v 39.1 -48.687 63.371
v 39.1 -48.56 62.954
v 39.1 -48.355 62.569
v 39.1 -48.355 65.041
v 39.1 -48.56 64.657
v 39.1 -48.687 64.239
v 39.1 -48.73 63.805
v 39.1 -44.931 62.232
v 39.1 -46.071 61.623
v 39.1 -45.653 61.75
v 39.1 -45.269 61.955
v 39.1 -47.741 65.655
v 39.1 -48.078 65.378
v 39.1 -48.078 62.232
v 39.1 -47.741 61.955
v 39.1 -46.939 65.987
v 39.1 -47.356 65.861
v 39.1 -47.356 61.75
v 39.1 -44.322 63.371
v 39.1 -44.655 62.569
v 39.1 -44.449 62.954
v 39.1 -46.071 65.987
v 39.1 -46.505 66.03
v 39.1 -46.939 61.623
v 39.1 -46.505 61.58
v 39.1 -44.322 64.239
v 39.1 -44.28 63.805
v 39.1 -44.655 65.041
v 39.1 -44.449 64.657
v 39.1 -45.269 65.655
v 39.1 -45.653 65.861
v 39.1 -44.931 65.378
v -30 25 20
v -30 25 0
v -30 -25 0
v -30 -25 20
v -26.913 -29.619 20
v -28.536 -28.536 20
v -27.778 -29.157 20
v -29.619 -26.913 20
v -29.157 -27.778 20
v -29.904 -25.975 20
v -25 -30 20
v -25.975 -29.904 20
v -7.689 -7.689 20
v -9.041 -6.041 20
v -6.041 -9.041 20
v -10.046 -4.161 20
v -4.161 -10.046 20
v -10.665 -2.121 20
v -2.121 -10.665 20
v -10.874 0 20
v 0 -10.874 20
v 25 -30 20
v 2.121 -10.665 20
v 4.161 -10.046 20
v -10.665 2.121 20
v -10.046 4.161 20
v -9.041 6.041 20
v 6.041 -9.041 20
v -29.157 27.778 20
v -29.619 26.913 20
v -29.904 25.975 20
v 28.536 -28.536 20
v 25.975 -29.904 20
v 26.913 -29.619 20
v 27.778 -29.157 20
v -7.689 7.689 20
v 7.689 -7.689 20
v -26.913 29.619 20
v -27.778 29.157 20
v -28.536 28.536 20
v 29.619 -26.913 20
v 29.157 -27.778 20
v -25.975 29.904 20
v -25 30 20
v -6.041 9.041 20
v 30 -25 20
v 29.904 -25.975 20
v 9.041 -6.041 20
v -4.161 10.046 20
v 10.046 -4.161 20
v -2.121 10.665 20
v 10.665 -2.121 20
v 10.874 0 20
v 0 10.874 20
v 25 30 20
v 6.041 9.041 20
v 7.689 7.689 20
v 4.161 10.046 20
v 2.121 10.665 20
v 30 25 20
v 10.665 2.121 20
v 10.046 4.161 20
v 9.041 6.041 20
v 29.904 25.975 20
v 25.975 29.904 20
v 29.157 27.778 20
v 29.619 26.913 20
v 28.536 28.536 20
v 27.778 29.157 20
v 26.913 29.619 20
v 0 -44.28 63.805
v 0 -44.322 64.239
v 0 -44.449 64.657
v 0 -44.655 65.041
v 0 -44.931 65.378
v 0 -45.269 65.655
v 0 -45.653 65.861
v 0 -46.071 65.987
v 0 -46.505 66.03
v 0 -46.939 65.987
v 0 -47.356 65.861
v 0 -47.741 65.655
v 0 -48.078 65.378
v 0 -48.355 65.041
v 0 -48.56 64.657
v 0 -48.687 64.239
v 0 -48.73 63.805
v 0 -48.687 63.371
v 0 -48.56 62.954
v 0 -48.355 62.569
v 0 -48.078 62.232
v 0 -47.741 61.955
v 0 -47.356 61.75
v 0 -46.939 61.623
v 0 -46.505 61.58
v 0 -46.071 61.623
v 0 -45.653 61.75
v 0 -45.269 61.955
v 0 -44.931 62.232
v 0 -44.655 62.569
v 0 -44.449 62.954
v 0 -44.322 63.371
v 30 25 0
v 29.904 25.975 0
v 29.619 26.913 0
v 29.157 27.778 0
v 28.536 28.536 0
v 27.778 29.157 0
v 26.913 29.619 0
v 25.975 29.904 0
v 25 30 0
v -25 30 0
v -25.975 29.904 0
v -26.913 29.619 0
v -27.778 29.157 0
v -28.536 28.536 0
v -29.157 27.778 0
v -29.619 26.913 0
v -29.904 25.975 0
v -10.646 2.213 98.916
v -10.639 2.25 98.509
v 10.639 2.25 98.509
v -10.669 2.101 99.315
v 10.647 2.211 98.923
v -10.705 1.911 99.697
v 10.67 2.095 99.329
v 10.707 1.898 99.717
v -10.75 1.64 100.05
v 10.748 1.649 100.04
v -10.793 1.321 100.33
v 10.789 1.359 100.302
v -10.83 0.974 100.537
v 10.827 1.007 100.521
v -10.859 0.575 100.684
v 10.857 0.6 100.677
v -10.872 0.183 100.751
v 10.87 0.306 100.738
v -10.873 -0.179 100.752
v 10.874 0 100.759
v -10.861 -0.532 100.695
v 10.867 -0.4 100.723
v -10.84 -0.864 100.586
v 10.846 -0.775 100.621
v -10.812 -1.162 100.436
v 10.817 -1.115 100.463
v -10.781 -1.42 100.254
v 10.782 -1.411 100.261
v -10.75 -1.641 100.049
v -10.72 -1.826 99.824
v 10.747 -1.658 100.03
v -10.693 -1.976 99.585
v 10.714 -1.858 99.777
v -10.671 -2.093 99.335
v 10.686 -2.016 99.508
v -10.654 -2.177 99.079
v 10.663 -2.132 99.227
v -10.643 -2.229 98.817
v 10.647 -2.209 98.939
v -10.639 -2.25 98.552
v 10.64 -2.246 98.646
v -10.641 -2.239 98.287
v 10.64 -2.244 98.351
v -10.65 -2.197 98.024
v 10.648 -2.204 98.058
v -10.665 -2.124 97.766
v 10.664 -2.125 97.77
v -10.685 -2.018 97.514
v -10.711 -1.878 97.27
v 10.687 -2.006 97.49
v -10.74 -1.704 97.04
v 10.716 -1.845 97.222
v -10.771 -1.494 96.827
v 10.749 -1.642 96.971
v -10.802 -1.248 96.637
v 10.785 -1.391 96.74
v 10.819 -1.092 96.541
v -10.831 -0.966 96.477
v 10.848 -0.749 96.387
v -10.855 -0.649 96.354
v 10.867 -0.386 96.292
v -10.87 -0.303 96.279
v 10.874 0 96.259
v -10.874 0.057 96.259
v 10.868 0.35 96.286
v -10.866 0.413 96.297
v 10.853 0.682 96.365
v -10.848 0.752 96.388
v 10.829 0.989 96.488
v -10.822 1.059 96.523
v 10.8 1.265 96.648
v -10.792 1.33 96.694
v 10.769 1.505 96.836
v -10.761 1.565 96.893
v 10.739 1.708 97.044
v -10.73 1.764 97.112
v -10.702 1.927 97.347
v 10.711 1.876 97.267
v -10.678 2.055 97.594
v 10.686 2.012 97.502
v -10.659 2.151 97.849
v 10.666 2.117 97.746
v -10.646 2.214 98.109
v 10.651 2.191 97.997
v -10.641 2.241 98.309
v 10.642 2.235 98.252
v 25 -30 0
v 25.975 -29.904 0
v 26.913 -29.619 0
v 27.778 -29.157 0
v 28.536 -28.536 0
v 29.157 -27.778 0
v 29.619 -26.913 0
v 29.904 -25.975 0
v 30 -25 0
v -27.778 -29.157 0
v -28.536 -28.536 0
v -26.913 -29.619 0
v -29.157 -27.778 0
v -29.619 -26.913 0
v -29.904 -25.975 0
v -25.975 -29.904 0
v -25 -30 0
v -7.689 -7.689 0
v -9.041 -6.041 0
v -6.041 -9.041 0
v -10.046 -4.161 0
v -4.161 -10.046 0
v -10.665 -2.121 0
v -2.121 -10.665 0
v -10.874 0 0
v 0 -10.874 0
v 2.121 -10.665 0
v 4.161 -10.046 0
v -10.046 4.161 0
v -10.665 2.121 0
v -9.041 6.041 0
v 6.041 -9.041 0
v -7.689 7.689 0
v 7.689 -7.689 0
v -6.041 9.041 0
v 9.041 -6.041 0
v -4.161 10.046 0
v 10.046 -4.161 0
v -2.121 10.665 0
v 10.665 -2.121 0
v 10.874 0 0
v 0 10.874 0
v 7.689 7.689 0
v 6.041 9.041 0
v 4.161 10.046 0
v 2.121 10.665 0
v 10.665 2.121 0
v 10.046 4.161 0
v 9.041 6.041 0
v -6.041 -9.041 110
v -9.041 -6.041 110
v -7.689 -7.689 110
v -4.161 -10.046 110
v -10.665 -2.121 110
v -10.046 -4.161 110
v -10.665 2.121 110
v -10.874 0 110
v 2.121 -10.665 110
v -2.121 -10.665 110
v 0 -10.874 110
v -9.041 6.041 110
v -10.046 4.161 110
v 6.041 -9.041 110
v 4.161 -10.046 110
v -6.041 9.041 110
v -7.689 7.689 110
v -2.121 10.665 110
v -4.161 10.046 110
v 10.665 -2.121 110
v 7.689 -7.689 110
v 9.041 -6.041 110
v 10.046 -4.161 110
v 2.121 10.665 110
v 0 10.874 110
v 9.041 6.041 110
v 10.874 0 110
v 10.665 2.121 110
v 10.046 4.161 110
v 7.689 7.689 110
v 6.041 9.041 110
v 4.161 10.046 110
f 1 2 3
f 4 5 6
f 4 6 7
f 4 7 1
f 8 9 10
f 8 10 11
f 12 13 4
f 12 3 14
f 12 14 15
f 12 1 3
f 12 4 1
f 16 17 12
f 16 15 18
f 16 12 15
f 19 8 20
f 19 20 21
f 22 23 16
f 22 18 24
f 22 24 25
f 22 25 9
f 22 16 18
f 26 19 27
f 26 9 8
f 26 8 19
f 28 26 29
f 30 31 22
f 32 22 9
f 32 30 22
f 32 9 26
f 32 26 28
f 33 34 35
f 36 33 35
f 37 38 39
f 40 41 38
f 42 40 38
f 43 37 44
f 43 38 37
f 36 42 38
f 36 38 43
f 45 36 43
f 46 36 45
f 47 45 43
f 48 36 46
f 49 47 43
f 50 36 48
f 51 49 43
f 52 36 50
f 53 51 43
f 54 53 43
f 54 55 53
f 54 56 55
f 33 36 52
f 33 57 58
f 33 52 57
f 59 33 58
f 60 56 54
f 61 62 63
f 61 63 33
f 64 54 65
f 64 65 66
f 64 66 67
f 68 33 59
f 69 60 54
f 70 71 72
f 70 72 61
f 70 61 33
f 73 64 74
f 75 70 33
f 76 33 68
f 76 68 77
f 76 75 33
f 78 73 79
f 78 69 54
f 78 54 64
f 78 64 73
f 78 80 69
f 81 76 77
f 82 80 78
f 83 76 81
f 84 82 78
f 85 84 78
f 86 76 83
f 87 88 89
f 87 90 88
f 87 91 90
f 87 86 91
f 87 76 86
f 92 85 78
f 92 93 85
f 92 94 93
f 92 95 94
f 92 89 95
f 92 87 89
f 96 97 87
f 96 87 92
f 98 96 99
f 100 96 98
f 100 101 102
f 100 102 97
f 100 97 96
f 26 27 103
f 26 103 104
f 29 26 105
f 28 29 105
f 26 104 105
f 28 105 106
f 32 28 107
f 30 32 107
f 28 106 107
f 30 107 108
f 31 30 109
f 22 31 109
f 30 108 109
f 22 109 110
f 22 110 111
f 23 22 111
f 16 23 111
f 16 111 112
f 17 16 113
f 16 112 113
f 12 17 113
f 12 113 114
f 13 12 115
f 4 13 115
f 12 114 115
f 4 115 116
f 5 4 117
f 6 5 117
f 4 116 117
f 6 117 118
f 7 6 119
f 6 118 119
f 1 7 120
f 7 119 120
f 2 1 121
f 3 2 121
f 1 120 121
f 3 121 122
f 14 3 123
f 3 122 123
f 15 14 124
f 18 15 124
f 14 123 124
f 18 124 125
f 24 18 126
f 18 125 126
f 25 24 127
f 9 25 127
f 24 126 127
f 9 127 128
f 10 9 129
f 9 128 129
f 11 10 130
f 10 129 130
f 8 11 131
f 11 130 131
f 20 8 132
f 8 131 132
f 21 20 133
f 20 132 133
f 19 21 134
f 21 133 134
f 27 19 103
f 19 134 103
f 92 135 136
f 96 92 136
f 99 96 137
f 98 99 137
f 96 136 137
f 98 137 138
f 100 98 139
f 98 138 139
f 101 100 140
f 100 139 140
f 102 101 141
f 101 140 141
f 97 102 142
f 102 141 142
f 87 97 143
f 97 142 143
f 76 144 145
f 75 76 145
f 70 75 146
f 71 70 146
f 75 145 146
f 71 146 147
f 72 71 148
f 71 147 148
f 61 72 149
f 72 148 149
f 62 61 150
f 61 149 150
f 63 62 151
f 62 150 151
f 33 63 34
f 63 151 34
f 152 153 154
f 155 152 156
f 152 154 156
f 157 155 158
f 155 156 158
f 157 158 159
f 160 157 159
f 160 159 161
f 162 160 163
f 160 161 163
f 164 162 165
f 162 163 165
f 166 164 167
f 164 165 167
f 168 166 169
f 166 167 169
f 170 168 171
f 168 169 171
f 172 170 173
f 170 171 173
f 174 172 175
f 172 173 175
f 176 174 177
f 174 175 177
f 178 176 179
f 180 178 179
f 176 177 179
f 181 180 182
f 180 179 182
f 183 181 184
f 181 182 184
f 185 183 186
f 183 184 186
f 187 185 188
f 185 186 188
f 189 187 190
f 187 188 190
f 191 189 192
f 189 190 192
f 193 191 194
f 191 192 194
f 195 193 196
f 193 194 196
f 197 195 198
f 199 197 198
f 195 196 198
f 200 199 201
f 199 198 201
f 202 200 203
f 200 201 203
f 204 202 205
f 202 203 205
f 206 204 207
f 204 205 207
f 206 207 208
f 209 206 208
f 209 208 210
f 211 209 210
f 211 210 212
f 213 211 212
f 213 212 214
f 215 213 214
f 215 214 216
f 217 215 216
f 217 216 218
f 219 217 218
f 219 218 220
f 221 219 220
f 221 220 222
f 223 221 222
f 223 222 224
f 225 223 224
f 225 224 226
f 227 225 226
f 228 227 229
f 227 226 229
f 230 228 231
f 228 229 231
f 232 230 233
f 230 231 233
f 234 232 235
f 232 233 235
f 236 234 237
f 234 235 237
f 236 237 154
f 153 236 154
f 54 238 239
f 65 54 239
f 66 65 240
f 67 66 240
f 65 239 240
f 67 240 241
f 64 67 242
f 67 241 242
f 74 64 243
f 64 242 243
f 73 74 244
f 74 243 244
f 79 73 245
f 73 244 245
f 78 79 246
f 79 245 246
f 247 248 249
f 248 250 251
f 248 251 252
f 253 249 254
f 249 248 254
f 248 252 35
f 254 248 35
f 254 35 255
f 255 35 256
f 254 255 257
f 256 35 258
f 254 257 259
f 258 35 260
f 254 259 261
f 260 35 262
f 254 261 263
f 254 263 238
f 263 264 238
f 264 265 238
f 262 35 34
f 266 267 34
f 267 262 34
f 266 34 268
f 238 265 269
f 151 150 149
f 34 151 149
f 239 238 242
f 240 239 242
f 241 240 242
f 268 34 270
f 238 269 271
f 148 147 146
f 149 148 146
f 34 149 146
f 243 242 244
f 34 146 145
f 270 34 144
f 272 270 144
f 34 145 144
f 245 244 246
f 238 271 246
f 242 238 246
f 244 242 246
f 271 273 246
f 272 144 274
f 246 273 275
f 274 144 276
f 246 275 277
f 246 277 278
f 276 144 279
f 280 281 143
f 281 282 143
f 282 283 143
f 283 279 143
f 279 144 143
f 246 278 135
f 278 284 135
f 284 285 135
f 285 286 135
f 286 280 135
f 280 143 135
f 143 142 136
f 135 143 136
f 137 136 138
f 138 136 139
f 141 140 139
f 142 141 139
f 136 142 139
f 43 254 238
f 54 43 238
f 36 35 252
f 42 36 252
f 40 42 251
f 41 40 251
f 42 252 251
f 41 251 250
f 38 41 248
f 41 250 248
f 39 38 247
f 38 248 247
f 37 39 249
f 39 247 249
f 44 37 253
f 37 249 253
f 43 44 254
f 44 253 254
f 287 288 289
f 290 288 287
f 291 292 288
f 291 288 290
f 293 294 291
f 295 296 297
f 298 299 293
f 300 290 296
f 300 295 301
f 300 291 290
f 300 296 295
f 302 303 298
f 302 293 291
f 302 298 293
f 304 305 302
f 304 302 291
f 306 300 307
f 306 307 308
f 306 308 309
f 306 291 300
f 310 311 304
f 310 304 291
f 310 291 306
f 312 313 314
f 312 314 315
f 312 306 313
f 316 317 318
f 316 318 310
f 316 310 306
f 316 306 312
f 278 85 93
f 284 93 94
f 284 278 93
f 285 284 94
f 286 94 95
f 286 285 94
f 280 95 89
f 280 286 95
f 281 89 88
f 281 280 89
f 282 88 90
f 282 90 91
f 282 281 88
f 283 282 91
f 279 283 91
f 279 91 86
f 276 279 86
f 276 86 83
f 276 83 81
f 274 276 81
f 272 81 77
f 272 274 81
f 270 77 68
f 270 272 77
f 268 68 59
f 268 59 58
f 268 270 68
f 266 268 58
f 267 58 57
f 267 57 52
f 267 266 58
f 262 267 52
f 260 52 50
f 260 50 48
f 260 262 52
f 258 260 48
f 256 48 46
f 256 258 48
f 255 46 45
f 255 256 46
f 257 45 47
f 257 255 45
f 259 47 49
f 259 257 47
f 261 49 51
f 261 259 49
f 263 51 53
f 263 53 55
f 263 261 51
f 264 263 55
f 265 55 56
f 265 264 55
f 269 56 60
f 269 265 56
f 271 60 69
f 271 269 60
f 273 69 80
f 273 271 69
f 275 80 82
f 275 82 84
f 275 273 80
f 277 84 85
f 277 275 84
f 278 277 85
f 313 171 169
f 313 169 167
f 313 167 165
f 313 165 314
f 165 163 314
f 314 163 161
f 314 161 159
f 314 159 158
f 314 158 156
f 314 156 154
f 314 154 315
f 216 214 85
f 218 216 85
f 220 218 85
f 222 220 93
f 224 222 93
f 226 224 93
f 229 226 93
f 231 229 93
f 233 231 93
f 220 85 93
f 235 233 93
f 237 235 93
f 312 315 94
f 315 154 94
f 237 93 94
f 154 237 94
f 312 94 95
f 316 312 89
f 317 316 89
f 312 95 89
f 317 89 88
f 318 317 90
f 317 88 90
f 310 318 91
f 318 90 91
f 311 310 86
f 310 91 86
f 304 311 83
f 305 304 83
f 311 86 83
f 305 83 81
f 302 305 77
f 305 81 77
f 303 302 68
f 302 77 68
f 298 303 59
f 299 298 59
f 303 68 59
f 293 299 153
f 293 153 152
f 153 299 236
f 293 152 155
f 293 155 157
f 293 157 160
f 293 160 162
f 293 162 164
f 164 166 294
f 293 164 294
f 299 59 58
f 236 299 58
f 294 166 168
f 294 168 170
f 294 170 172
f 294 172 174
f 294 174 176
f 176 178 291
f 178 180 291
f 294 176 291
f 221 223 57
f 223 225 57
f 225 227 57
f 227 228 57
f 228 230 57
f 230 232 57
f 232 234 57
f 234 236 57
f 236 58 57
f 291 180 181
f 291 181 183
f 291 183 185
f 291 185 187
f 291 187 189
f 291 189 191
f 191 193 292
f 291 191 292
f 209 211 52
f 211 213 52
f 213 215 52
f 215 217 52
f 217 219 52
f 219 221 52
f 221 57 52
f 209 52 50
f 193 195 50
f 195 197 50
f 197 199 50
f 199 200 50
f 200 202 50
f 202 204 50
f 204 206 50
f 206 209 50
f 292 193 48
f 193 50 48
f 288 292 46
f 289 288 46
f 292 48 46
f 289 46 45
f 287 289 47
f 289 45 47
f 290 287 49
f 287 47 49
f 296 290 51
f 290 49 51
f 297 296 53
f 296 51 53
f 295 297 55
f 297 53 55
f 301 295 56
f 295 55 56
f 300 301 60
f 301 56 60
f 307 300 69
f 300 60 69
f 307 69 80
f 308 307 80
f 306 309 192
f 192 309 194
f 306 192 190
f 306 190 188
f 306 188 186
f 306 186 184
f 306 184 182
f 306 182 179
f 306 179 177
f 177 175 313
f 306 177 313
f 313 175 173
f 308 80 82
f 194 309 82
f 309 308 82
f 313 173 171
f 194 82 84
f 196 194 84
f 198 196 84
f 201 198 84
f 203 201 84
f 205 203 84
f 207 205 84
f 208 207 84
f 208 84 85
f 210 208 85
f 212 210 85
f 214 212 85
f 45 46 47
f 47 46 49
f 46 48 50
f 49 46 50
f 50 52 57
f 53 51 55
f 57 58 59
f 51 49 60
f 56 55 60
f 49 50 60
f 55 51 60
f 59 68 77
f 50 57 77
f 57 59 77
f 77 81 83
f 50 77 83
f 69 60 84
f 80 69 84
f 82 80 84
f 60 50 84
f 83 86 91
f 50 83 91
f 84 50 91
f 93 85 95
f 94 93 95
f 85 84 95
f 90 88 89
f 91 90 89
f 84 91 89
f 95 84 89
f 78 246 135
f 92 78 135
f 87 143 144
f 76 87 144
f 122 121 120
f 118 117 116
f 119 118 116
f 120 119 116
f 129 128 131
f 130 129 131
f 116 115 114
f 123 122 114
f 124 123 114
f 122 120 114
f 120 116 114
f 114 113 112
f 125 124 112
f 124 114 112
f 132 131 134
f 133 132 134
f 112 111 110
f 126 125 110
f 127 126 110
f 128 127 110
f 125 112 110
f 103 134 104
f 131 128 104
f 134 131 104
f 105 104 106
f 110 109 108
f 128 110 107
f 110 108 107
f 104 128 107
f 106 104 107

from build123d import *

# Parameters (mm, degrees)
F0_R     = 10.87401
F1_DEPTH = 20
F2_R     = 10.87401
F3_DEPTH = 90
F4_R     = 2.25
F5_DEPTH = 22.7
F6_R     = 2.225
F7_DEPTH = 39.1


with BuildPart() as f1:
    # F0 (on Top) → F1 (new body)
    with BuildSketch(Plane.XY):
        with BuildLine():
            Line((25, 30), (-25, 30))
            ThreePointArc((-25, 30), (-28.535534, 28.535534), (-30, 25))
            Line((-30, 25), (-30, -25))
            ThreePointArc((-30, -25), (-28.535534, -28.535534), (-25, -30))
            Line((-25, -30), (25, -30))
            ThreePointArc((25, -30), (28.535534, -28.535534), (30, -25))
            Line((30, -25), (30, 25))
            ThreePointArc((30, 25), (28.535534, 28.535534), (25, 30))
        make_face()
        Circle(F0_R, mode=Mode.SUBTRACT)
    extrude(amount=F1_DEPTH)


with BuildPart() as f3:
    # F2 (on face) → F3 (new body)
    with BuildSketch(Plane.XY.offset(20)):
        Circle(F2_R)
    extrude(amount=F3_DEPTH)

    # F4 (on Right) → F5 (cut, symmetric)
    with BuildSketch(Plane.YZ):
        with Locations((0, 98.508764)):
            Circle(F4_R)
    extrude(amount=F5_DEPTH, both=True, mode=Mode.SUBTRACT)


with BuildPart() as f7:
    # F6 (on Right) → F7 (new body)
    with BuildSketch(Plane.YZ):
        with Locations((-46.504702, 63.805148)):
            Circle(F6_R)
    extrude(amount=F7_DEPTH)


solid = Compound([f1.part, f3.part, f7.part])
